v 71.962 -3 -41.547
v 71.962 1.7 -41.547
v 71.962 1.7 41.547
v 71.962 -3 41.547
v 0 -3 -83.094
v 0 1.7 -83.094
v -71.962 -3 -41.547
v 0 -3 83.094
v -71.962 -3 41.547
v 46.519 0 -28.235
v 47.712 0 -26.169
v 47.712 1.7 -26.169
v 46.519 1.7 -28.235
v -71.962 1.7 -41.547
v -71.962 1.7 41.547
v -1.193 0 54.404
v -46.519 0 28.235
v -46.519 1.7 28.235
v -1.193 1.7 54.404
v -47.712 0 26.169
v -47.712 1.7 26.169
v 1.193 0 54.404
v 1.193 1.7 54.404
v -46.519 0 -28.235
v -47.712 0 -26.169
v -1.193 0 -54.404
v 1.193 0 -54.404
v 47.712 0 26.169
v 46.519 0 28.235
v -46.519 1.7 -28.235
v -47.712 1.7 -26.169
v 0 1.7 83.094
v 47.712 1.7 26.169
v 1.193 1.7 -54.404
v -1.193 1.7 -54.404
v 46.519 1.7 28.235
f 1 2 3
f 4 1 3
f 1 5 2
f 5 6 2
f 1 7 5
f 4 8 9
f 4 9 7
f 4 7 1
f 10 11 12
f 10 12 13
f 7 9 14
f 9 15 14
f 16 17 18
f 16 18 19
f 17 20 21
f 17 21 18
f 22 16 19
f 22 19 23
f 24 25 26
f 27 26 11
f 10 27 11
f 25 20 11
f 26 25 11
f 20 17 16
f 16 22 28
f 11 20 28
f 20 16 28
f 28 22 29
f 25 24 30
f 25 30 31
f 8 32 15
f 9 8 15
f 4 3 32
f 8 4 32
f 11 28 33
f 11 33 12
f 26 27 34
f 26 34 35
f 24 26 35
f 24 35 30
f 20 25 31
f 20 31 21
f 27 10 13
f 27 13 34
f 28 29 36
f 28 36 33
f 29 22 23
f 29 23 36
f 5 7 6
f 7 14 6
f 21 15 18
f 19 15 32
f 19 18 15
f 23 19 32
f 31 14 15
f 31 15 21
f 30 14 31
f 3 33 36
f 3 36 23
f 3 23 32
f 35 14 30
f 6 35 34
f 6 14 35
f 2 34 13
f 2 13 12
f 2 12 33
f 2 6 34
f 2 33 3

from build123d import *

# Parameters (mm, degrees)
BOSS_EXTRUDE2_DEPTH = 1.7
BOSS_EXTRUDE3_DEPTH = 3


with BuildPart() as part:
    # Sketch3 → Boss-Extrude2 (new body)
    with BuildSketch(Plane(origin=(0, 0, 0), x_dir=(1, 0, 0), z_dir=(0, 1, 0))):
        Polygon((0, -83.094010768), (71.961524227, -41.547005384), (71.961524227, 41.547005384), (0, 83.094010768), (-71.961524227, 41.547005384), (-71.961524227, -41.547005384), align=None)
        Polygon((-1.192537669, 54.404010768), (-46.518986558, 28.2347733), (-47.711524227, 26.169237467), (-47.711524227, -26.169237467), (-46.518986558, -28.2347733), (-1.192537669, -54.404010768), (1.192537669, -54.404010768), (46.518986558, -28.2347733), (47.711524227, -26.169237467), (47.711524227, 26.169237467), (46.518986558, 28.2347733), (1.192537669, 54.404010768), align=None, mode=Mode.SUBTRACT)
    extrude(amount=BOSS_EXTRUDE2_DEPTH)

    # Sketch6 → Boss-Extrude3 (add)
    with BuildSketch(Plane.XZ):
        Polygon((0, 83.094010768), (-71.961524227, 41.547005384), (-71.961524227, -41.547005384), (0, -83.094010768), (71.961524227, -41.547005384), (71.961524227, 41.547005384), align=None)
    extrude(amount=BOSS_EXTRUDE3_DEPTH)


solid = part.part
